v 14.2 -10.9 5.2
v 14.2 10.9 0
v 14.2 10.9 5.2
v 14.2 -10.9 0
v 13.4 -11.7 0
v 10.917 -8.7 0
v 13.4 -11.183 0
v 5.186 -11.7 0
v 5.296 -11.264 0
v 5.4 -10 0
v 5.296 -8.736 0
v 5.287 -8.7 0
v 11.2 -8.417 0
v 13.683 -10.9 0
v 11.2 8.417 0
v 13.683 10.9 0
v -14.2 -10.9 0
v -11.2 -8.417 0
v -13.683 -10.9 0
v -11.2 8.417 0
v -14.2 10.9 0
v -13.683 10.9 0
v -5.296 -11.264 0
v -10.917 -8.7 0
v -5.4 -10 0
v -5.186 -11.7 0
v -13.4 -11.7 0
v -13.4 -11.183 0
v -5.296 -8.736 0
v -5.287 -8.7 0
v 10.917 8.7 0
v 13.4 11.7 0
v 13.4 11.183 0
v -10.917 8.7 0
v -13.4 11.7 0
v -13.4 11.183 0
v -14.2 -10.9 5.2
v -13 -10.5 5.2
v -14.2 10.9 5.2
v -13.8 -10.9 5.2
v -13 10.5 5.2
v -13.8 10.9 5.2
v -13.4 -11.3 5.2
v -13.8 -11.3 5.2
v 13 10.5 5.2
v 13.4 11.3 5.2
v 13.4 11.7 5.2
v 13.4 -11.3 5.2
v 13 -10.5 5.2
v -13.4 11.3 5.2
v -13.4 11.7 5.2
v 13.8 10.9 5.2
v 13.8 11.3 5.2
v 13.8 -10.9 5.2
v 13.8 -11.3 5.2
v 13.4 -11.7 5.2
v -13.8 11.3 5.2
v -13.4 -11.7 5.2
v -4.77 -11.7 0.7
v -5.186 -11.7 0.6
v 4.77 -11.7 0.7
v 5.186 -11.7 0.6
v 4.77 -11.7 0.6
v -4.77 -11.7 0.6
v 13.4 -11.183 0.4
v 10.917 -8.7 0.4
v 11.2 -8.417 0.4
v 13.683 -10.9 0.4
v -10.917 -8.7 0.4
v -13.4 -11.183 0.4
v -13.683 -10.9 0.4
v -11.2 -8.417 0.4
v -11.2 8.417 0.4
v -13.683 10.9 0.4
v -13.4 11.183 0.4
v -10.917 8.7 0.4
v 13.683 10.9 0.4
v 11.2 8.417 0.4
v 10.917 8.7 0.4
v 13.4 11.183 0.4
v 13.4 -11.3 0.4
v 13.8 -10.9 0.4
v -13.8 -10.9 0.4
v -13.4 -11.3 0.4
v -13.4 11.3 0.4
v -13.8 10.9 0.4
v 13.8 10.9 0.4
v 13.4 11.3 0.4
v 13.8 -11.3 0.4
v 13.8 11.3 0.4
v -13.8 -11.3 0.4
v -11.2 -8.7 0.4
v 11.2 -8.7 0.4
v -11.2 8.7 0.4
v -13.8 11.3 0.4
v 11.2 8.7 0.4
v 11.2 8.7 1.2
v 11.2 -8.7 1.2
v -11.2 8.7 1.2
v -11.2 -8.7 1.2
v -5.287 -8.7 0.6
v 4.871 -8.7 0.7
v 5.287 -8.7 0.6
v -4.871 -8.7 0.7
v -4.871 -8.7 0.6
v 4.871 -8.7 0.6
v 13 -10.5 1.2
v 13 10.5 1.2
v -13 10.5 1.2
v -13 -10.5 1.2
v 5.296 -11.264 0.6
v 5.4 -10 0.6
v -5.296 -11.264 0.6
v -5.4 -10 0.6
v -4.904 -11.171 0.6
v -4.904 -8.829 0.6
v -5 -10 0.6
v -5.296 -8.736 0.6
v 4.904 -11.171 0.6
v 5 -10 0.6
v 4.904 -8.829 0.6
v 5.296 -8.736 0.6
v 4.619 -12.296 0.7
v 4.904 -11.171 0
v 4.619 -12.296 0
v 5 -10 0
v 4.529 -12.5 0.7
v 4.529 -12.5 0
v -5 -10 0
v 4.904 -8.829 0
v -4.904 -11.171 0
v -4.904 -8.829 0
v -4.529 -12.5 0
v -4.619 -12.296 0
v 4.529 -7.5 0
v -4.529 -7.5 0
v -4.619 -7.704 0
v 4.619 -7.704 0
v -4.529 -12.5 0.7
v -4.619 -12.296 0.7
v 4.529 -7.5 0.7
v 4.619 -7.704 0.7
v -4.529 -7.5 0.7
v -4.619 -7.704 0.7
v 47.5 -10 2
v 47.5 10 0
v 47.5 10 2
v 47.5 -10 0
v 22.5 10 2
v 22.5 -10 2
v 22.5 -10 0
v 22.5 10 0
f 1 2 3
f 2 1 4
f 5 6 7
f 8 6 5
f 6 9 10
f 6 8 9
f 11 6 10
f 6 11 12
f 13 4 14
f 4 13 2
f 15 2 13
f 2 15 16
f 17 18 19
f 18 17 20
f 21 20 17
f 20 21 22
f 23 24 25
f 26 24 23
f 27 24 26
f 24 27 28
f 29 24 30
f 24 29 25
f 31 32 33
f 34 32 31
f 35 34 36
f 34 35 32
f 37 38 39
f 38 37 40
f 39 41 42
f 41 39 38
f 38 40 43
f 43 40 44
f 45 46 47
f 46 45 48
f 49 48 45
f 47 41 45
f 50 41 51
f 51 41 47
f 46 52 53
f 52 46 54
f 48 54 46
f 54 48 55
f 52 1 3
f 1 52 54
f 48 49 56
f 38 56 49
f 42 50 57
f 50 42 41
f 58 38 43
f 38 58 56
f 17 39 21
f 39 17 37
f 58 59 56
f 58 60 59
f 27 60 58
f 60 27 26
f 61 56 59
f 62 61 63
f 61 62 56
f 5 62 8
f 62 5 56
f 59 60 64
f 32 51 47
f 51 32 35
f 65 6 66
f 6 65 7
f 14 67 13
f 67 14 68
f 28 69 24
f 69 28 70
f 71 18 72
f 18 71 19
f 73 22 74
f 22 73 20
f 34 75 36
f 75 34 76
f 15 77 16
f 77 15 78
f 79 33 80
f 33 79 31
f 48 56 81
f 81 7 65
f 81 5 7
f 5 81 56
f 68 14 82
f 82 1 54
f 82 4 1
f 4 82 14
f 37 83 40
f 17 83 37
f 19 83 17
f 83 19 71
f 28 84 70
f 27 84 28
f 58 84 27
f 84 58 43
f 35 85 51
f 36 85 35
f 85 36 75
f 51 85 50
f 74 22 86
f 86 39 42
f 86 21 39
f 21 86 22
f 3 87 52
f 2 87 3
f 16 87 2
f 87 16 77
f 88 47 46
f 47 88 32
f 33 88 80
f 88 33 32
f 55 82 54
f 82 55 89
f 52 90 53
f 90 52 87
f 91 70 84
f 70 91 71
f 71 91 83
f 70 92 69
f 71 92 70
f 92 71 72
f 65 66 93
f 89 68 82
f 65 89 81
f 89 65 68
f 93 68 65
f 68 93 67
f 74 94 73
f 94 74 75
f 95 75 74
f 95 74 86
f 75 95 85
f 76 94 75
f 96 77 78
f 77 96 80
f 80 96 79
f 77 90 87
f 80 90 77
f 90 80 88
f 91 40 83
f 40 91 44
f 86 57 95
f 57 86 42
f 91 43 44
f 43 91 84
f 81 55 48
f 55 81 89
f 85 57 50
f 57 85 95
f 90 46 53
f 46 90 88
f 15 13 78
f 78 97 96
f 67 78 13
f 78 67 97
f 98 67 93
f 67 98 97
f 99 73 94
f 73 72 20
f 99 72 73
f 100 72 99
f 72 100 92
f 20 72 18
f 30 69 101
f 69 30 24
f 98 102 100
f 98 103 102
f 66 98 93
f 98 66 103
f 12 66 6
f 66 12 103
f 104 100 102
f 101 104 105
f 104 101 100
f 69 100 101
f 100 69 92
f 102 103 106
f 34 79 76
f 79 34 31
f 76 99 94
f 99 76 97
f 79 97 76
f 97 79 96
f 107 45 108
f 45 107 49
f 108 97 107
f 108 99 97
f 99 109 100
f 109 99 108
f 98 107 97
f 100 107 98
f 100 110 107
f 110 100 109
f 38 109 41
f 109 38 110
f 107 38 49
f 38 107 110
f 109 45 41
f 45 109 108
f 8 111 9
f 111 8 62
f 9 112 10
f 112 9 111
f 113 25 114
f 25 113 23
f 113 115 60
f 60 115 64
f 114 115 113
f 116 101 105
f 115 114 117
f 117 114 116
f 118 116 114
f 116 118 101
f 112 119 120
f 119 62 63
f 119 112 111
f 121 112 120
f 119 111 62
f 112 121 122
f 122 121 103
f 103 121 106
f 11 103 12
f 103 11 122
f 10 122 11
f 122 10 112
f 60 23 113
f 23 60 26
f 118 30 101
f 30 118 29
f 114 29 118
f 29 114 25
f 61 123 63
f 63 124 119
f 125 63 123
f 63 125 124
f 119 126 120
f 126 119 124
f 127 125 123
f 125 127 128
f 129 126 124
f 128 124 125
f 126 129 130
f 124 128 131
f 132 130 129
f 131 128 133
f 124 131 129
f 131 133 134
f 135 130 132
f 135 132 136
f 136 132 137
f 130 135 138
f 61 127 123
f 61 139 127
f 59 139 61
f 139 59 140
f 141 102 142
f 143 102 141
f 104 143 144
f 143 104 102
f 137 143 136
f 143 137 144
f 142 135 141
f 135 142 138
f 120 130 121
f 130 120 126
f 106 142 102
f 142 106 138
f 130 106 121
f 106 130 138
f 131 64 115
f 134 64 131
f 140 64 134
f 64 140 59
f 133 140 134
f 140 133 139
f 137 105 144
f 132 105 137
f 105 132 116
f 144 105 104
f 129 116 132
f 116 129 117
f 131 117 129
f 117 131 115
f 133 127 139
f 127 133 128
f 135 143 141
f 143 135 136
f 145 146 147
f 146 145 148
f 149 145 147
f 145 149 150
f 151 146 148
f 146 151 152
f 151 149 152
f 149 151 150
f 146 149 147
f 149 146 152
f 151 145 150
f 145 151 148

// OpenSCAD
/* [Parameters] */

width = 25;
height = 20;
gap = 2;
namePlateWidth = 10;
namePlateHeight = 5;

/* [Hidden] */
woodThick = 1.2;
woodGap = 0.4;
boardThick = 3;
baseThick = 2;
boxHeight = gap + woodThick + baseThick;

$fn = 32;

module frameBase(w, h)
{
    
    angle = atan2(h, w);

    difference() {
            union() {
            difference() {
                // main box
                cube([w, h, boxHeight], center=true);
                
                // start geometry for gaps
                translate([w/2, h/2, 0])
                rotate([0,0,45])
                cube([boardThick*3, woodGap, boxHeight*2], center=true);

                translate([-w/2, h/2, 0])
                rotate([0,0,-45])
                cube([boardThick*3, woodGap, boxHeight*2], center=true);

                translate([-w/2, h/2, 0])
                rotate([0,0,-45])
                cube([boardThick*3, woodGap, boxHeight*2], center=true);

                translate([-w/2, -h/2, 0])
                rotate([0,0,45])
                cube([boardThick*3, woodGap, boxHeight*2], center=true);

                translate([w/2, -h/2, 0])
                rotate([0,0,-45])
                cube([boardThick*3, woodGap, boxHeight*2], center=true);

                // extra corner boxes
                translate([w/2-woodGap*2,h/2-woodGap*2, -boxHeight])
                cube([5,5, boxHeight*2]);

                translate([-w/2+woodGap*2,h/2-woodGap*2, -boxHeight])
                rotate([0,0,90])
                cube([5,5, boxHeight*2]);

                translate([-w/2+woodGap*2,-h/2+woodGap*2, -boxHeight])
                rotate([0,0,180])
                cube([5,5, boxHeight*2]);

                translate([w/2-woodGap*2,-h/2+woodGap*2, -boxHeight])
                rotate([0,0,-90])
                cube([5,5, boxHeight*2]);
                
                translate([0,0, (boxHeight/2) + 2.5 + 1])
                cube([w+5, h+5, 5], center=true);
            }

            
            translate([0,0,-woodGap/2])
            cube([w-(woodGap*2), h-(woodGap*2), boxHeight-woodGap], center=true);
            }
            
            cube([w-(boardThick*2), h-(boardThick*2), boxHeight*2], center=true);
        
        translate([0,0,-woodThick])
        cube([w-(woodThick*2), h-(woodThick*2), boxHeight], center=true);
    }
}

module namePlate(w, h, thick)
{
    difference() {
        scale([1,1.2,1])
        cylinder(r=w/2, h=thick);
        
        translate([-w,h/2,-1.5])
        cube([w*2, h*5, thick*3]);

        rotate([0,0,180])    
        translate([-w,h/2,-1.5])
        cube([w*2, h*5, thick*3]);    
    }
}


module frame(w, h)
{
    totalWidth = w + ((woodThick + 0.5)*2);
    totalHeight = h + ((woodThick + 0.5)*2);
    
    namePlatePos = h/2;// - boardThick/2;
    
    union() {
        difference() {
            frameBase(totalWidth, totalHeight);

            translate([0, namePlatePos, boxHeight/2-woodThick/2])
            namePlate(namePlateWidth+(woodGap*2),namePlateHeight+(woodGap*2), 2);
        }

        translate([0, namePlatePos, boxHeight/2-woodThick/2-0.1])
        scale([1,1,woodThick/2+0.1])
        namePlate(namePlateWidth,namePlateHeight, 1);
    }
}

module insert(w, h)
{
    cube([w, h, baseThick], center=true);
}


translate([0,0,boxHeight/2])
rotate([180,0,0])
frame(width, height);

translate([width + 10,0,baseThick/2])
// translate([0,0,boxHeight])

insert(width, height);
